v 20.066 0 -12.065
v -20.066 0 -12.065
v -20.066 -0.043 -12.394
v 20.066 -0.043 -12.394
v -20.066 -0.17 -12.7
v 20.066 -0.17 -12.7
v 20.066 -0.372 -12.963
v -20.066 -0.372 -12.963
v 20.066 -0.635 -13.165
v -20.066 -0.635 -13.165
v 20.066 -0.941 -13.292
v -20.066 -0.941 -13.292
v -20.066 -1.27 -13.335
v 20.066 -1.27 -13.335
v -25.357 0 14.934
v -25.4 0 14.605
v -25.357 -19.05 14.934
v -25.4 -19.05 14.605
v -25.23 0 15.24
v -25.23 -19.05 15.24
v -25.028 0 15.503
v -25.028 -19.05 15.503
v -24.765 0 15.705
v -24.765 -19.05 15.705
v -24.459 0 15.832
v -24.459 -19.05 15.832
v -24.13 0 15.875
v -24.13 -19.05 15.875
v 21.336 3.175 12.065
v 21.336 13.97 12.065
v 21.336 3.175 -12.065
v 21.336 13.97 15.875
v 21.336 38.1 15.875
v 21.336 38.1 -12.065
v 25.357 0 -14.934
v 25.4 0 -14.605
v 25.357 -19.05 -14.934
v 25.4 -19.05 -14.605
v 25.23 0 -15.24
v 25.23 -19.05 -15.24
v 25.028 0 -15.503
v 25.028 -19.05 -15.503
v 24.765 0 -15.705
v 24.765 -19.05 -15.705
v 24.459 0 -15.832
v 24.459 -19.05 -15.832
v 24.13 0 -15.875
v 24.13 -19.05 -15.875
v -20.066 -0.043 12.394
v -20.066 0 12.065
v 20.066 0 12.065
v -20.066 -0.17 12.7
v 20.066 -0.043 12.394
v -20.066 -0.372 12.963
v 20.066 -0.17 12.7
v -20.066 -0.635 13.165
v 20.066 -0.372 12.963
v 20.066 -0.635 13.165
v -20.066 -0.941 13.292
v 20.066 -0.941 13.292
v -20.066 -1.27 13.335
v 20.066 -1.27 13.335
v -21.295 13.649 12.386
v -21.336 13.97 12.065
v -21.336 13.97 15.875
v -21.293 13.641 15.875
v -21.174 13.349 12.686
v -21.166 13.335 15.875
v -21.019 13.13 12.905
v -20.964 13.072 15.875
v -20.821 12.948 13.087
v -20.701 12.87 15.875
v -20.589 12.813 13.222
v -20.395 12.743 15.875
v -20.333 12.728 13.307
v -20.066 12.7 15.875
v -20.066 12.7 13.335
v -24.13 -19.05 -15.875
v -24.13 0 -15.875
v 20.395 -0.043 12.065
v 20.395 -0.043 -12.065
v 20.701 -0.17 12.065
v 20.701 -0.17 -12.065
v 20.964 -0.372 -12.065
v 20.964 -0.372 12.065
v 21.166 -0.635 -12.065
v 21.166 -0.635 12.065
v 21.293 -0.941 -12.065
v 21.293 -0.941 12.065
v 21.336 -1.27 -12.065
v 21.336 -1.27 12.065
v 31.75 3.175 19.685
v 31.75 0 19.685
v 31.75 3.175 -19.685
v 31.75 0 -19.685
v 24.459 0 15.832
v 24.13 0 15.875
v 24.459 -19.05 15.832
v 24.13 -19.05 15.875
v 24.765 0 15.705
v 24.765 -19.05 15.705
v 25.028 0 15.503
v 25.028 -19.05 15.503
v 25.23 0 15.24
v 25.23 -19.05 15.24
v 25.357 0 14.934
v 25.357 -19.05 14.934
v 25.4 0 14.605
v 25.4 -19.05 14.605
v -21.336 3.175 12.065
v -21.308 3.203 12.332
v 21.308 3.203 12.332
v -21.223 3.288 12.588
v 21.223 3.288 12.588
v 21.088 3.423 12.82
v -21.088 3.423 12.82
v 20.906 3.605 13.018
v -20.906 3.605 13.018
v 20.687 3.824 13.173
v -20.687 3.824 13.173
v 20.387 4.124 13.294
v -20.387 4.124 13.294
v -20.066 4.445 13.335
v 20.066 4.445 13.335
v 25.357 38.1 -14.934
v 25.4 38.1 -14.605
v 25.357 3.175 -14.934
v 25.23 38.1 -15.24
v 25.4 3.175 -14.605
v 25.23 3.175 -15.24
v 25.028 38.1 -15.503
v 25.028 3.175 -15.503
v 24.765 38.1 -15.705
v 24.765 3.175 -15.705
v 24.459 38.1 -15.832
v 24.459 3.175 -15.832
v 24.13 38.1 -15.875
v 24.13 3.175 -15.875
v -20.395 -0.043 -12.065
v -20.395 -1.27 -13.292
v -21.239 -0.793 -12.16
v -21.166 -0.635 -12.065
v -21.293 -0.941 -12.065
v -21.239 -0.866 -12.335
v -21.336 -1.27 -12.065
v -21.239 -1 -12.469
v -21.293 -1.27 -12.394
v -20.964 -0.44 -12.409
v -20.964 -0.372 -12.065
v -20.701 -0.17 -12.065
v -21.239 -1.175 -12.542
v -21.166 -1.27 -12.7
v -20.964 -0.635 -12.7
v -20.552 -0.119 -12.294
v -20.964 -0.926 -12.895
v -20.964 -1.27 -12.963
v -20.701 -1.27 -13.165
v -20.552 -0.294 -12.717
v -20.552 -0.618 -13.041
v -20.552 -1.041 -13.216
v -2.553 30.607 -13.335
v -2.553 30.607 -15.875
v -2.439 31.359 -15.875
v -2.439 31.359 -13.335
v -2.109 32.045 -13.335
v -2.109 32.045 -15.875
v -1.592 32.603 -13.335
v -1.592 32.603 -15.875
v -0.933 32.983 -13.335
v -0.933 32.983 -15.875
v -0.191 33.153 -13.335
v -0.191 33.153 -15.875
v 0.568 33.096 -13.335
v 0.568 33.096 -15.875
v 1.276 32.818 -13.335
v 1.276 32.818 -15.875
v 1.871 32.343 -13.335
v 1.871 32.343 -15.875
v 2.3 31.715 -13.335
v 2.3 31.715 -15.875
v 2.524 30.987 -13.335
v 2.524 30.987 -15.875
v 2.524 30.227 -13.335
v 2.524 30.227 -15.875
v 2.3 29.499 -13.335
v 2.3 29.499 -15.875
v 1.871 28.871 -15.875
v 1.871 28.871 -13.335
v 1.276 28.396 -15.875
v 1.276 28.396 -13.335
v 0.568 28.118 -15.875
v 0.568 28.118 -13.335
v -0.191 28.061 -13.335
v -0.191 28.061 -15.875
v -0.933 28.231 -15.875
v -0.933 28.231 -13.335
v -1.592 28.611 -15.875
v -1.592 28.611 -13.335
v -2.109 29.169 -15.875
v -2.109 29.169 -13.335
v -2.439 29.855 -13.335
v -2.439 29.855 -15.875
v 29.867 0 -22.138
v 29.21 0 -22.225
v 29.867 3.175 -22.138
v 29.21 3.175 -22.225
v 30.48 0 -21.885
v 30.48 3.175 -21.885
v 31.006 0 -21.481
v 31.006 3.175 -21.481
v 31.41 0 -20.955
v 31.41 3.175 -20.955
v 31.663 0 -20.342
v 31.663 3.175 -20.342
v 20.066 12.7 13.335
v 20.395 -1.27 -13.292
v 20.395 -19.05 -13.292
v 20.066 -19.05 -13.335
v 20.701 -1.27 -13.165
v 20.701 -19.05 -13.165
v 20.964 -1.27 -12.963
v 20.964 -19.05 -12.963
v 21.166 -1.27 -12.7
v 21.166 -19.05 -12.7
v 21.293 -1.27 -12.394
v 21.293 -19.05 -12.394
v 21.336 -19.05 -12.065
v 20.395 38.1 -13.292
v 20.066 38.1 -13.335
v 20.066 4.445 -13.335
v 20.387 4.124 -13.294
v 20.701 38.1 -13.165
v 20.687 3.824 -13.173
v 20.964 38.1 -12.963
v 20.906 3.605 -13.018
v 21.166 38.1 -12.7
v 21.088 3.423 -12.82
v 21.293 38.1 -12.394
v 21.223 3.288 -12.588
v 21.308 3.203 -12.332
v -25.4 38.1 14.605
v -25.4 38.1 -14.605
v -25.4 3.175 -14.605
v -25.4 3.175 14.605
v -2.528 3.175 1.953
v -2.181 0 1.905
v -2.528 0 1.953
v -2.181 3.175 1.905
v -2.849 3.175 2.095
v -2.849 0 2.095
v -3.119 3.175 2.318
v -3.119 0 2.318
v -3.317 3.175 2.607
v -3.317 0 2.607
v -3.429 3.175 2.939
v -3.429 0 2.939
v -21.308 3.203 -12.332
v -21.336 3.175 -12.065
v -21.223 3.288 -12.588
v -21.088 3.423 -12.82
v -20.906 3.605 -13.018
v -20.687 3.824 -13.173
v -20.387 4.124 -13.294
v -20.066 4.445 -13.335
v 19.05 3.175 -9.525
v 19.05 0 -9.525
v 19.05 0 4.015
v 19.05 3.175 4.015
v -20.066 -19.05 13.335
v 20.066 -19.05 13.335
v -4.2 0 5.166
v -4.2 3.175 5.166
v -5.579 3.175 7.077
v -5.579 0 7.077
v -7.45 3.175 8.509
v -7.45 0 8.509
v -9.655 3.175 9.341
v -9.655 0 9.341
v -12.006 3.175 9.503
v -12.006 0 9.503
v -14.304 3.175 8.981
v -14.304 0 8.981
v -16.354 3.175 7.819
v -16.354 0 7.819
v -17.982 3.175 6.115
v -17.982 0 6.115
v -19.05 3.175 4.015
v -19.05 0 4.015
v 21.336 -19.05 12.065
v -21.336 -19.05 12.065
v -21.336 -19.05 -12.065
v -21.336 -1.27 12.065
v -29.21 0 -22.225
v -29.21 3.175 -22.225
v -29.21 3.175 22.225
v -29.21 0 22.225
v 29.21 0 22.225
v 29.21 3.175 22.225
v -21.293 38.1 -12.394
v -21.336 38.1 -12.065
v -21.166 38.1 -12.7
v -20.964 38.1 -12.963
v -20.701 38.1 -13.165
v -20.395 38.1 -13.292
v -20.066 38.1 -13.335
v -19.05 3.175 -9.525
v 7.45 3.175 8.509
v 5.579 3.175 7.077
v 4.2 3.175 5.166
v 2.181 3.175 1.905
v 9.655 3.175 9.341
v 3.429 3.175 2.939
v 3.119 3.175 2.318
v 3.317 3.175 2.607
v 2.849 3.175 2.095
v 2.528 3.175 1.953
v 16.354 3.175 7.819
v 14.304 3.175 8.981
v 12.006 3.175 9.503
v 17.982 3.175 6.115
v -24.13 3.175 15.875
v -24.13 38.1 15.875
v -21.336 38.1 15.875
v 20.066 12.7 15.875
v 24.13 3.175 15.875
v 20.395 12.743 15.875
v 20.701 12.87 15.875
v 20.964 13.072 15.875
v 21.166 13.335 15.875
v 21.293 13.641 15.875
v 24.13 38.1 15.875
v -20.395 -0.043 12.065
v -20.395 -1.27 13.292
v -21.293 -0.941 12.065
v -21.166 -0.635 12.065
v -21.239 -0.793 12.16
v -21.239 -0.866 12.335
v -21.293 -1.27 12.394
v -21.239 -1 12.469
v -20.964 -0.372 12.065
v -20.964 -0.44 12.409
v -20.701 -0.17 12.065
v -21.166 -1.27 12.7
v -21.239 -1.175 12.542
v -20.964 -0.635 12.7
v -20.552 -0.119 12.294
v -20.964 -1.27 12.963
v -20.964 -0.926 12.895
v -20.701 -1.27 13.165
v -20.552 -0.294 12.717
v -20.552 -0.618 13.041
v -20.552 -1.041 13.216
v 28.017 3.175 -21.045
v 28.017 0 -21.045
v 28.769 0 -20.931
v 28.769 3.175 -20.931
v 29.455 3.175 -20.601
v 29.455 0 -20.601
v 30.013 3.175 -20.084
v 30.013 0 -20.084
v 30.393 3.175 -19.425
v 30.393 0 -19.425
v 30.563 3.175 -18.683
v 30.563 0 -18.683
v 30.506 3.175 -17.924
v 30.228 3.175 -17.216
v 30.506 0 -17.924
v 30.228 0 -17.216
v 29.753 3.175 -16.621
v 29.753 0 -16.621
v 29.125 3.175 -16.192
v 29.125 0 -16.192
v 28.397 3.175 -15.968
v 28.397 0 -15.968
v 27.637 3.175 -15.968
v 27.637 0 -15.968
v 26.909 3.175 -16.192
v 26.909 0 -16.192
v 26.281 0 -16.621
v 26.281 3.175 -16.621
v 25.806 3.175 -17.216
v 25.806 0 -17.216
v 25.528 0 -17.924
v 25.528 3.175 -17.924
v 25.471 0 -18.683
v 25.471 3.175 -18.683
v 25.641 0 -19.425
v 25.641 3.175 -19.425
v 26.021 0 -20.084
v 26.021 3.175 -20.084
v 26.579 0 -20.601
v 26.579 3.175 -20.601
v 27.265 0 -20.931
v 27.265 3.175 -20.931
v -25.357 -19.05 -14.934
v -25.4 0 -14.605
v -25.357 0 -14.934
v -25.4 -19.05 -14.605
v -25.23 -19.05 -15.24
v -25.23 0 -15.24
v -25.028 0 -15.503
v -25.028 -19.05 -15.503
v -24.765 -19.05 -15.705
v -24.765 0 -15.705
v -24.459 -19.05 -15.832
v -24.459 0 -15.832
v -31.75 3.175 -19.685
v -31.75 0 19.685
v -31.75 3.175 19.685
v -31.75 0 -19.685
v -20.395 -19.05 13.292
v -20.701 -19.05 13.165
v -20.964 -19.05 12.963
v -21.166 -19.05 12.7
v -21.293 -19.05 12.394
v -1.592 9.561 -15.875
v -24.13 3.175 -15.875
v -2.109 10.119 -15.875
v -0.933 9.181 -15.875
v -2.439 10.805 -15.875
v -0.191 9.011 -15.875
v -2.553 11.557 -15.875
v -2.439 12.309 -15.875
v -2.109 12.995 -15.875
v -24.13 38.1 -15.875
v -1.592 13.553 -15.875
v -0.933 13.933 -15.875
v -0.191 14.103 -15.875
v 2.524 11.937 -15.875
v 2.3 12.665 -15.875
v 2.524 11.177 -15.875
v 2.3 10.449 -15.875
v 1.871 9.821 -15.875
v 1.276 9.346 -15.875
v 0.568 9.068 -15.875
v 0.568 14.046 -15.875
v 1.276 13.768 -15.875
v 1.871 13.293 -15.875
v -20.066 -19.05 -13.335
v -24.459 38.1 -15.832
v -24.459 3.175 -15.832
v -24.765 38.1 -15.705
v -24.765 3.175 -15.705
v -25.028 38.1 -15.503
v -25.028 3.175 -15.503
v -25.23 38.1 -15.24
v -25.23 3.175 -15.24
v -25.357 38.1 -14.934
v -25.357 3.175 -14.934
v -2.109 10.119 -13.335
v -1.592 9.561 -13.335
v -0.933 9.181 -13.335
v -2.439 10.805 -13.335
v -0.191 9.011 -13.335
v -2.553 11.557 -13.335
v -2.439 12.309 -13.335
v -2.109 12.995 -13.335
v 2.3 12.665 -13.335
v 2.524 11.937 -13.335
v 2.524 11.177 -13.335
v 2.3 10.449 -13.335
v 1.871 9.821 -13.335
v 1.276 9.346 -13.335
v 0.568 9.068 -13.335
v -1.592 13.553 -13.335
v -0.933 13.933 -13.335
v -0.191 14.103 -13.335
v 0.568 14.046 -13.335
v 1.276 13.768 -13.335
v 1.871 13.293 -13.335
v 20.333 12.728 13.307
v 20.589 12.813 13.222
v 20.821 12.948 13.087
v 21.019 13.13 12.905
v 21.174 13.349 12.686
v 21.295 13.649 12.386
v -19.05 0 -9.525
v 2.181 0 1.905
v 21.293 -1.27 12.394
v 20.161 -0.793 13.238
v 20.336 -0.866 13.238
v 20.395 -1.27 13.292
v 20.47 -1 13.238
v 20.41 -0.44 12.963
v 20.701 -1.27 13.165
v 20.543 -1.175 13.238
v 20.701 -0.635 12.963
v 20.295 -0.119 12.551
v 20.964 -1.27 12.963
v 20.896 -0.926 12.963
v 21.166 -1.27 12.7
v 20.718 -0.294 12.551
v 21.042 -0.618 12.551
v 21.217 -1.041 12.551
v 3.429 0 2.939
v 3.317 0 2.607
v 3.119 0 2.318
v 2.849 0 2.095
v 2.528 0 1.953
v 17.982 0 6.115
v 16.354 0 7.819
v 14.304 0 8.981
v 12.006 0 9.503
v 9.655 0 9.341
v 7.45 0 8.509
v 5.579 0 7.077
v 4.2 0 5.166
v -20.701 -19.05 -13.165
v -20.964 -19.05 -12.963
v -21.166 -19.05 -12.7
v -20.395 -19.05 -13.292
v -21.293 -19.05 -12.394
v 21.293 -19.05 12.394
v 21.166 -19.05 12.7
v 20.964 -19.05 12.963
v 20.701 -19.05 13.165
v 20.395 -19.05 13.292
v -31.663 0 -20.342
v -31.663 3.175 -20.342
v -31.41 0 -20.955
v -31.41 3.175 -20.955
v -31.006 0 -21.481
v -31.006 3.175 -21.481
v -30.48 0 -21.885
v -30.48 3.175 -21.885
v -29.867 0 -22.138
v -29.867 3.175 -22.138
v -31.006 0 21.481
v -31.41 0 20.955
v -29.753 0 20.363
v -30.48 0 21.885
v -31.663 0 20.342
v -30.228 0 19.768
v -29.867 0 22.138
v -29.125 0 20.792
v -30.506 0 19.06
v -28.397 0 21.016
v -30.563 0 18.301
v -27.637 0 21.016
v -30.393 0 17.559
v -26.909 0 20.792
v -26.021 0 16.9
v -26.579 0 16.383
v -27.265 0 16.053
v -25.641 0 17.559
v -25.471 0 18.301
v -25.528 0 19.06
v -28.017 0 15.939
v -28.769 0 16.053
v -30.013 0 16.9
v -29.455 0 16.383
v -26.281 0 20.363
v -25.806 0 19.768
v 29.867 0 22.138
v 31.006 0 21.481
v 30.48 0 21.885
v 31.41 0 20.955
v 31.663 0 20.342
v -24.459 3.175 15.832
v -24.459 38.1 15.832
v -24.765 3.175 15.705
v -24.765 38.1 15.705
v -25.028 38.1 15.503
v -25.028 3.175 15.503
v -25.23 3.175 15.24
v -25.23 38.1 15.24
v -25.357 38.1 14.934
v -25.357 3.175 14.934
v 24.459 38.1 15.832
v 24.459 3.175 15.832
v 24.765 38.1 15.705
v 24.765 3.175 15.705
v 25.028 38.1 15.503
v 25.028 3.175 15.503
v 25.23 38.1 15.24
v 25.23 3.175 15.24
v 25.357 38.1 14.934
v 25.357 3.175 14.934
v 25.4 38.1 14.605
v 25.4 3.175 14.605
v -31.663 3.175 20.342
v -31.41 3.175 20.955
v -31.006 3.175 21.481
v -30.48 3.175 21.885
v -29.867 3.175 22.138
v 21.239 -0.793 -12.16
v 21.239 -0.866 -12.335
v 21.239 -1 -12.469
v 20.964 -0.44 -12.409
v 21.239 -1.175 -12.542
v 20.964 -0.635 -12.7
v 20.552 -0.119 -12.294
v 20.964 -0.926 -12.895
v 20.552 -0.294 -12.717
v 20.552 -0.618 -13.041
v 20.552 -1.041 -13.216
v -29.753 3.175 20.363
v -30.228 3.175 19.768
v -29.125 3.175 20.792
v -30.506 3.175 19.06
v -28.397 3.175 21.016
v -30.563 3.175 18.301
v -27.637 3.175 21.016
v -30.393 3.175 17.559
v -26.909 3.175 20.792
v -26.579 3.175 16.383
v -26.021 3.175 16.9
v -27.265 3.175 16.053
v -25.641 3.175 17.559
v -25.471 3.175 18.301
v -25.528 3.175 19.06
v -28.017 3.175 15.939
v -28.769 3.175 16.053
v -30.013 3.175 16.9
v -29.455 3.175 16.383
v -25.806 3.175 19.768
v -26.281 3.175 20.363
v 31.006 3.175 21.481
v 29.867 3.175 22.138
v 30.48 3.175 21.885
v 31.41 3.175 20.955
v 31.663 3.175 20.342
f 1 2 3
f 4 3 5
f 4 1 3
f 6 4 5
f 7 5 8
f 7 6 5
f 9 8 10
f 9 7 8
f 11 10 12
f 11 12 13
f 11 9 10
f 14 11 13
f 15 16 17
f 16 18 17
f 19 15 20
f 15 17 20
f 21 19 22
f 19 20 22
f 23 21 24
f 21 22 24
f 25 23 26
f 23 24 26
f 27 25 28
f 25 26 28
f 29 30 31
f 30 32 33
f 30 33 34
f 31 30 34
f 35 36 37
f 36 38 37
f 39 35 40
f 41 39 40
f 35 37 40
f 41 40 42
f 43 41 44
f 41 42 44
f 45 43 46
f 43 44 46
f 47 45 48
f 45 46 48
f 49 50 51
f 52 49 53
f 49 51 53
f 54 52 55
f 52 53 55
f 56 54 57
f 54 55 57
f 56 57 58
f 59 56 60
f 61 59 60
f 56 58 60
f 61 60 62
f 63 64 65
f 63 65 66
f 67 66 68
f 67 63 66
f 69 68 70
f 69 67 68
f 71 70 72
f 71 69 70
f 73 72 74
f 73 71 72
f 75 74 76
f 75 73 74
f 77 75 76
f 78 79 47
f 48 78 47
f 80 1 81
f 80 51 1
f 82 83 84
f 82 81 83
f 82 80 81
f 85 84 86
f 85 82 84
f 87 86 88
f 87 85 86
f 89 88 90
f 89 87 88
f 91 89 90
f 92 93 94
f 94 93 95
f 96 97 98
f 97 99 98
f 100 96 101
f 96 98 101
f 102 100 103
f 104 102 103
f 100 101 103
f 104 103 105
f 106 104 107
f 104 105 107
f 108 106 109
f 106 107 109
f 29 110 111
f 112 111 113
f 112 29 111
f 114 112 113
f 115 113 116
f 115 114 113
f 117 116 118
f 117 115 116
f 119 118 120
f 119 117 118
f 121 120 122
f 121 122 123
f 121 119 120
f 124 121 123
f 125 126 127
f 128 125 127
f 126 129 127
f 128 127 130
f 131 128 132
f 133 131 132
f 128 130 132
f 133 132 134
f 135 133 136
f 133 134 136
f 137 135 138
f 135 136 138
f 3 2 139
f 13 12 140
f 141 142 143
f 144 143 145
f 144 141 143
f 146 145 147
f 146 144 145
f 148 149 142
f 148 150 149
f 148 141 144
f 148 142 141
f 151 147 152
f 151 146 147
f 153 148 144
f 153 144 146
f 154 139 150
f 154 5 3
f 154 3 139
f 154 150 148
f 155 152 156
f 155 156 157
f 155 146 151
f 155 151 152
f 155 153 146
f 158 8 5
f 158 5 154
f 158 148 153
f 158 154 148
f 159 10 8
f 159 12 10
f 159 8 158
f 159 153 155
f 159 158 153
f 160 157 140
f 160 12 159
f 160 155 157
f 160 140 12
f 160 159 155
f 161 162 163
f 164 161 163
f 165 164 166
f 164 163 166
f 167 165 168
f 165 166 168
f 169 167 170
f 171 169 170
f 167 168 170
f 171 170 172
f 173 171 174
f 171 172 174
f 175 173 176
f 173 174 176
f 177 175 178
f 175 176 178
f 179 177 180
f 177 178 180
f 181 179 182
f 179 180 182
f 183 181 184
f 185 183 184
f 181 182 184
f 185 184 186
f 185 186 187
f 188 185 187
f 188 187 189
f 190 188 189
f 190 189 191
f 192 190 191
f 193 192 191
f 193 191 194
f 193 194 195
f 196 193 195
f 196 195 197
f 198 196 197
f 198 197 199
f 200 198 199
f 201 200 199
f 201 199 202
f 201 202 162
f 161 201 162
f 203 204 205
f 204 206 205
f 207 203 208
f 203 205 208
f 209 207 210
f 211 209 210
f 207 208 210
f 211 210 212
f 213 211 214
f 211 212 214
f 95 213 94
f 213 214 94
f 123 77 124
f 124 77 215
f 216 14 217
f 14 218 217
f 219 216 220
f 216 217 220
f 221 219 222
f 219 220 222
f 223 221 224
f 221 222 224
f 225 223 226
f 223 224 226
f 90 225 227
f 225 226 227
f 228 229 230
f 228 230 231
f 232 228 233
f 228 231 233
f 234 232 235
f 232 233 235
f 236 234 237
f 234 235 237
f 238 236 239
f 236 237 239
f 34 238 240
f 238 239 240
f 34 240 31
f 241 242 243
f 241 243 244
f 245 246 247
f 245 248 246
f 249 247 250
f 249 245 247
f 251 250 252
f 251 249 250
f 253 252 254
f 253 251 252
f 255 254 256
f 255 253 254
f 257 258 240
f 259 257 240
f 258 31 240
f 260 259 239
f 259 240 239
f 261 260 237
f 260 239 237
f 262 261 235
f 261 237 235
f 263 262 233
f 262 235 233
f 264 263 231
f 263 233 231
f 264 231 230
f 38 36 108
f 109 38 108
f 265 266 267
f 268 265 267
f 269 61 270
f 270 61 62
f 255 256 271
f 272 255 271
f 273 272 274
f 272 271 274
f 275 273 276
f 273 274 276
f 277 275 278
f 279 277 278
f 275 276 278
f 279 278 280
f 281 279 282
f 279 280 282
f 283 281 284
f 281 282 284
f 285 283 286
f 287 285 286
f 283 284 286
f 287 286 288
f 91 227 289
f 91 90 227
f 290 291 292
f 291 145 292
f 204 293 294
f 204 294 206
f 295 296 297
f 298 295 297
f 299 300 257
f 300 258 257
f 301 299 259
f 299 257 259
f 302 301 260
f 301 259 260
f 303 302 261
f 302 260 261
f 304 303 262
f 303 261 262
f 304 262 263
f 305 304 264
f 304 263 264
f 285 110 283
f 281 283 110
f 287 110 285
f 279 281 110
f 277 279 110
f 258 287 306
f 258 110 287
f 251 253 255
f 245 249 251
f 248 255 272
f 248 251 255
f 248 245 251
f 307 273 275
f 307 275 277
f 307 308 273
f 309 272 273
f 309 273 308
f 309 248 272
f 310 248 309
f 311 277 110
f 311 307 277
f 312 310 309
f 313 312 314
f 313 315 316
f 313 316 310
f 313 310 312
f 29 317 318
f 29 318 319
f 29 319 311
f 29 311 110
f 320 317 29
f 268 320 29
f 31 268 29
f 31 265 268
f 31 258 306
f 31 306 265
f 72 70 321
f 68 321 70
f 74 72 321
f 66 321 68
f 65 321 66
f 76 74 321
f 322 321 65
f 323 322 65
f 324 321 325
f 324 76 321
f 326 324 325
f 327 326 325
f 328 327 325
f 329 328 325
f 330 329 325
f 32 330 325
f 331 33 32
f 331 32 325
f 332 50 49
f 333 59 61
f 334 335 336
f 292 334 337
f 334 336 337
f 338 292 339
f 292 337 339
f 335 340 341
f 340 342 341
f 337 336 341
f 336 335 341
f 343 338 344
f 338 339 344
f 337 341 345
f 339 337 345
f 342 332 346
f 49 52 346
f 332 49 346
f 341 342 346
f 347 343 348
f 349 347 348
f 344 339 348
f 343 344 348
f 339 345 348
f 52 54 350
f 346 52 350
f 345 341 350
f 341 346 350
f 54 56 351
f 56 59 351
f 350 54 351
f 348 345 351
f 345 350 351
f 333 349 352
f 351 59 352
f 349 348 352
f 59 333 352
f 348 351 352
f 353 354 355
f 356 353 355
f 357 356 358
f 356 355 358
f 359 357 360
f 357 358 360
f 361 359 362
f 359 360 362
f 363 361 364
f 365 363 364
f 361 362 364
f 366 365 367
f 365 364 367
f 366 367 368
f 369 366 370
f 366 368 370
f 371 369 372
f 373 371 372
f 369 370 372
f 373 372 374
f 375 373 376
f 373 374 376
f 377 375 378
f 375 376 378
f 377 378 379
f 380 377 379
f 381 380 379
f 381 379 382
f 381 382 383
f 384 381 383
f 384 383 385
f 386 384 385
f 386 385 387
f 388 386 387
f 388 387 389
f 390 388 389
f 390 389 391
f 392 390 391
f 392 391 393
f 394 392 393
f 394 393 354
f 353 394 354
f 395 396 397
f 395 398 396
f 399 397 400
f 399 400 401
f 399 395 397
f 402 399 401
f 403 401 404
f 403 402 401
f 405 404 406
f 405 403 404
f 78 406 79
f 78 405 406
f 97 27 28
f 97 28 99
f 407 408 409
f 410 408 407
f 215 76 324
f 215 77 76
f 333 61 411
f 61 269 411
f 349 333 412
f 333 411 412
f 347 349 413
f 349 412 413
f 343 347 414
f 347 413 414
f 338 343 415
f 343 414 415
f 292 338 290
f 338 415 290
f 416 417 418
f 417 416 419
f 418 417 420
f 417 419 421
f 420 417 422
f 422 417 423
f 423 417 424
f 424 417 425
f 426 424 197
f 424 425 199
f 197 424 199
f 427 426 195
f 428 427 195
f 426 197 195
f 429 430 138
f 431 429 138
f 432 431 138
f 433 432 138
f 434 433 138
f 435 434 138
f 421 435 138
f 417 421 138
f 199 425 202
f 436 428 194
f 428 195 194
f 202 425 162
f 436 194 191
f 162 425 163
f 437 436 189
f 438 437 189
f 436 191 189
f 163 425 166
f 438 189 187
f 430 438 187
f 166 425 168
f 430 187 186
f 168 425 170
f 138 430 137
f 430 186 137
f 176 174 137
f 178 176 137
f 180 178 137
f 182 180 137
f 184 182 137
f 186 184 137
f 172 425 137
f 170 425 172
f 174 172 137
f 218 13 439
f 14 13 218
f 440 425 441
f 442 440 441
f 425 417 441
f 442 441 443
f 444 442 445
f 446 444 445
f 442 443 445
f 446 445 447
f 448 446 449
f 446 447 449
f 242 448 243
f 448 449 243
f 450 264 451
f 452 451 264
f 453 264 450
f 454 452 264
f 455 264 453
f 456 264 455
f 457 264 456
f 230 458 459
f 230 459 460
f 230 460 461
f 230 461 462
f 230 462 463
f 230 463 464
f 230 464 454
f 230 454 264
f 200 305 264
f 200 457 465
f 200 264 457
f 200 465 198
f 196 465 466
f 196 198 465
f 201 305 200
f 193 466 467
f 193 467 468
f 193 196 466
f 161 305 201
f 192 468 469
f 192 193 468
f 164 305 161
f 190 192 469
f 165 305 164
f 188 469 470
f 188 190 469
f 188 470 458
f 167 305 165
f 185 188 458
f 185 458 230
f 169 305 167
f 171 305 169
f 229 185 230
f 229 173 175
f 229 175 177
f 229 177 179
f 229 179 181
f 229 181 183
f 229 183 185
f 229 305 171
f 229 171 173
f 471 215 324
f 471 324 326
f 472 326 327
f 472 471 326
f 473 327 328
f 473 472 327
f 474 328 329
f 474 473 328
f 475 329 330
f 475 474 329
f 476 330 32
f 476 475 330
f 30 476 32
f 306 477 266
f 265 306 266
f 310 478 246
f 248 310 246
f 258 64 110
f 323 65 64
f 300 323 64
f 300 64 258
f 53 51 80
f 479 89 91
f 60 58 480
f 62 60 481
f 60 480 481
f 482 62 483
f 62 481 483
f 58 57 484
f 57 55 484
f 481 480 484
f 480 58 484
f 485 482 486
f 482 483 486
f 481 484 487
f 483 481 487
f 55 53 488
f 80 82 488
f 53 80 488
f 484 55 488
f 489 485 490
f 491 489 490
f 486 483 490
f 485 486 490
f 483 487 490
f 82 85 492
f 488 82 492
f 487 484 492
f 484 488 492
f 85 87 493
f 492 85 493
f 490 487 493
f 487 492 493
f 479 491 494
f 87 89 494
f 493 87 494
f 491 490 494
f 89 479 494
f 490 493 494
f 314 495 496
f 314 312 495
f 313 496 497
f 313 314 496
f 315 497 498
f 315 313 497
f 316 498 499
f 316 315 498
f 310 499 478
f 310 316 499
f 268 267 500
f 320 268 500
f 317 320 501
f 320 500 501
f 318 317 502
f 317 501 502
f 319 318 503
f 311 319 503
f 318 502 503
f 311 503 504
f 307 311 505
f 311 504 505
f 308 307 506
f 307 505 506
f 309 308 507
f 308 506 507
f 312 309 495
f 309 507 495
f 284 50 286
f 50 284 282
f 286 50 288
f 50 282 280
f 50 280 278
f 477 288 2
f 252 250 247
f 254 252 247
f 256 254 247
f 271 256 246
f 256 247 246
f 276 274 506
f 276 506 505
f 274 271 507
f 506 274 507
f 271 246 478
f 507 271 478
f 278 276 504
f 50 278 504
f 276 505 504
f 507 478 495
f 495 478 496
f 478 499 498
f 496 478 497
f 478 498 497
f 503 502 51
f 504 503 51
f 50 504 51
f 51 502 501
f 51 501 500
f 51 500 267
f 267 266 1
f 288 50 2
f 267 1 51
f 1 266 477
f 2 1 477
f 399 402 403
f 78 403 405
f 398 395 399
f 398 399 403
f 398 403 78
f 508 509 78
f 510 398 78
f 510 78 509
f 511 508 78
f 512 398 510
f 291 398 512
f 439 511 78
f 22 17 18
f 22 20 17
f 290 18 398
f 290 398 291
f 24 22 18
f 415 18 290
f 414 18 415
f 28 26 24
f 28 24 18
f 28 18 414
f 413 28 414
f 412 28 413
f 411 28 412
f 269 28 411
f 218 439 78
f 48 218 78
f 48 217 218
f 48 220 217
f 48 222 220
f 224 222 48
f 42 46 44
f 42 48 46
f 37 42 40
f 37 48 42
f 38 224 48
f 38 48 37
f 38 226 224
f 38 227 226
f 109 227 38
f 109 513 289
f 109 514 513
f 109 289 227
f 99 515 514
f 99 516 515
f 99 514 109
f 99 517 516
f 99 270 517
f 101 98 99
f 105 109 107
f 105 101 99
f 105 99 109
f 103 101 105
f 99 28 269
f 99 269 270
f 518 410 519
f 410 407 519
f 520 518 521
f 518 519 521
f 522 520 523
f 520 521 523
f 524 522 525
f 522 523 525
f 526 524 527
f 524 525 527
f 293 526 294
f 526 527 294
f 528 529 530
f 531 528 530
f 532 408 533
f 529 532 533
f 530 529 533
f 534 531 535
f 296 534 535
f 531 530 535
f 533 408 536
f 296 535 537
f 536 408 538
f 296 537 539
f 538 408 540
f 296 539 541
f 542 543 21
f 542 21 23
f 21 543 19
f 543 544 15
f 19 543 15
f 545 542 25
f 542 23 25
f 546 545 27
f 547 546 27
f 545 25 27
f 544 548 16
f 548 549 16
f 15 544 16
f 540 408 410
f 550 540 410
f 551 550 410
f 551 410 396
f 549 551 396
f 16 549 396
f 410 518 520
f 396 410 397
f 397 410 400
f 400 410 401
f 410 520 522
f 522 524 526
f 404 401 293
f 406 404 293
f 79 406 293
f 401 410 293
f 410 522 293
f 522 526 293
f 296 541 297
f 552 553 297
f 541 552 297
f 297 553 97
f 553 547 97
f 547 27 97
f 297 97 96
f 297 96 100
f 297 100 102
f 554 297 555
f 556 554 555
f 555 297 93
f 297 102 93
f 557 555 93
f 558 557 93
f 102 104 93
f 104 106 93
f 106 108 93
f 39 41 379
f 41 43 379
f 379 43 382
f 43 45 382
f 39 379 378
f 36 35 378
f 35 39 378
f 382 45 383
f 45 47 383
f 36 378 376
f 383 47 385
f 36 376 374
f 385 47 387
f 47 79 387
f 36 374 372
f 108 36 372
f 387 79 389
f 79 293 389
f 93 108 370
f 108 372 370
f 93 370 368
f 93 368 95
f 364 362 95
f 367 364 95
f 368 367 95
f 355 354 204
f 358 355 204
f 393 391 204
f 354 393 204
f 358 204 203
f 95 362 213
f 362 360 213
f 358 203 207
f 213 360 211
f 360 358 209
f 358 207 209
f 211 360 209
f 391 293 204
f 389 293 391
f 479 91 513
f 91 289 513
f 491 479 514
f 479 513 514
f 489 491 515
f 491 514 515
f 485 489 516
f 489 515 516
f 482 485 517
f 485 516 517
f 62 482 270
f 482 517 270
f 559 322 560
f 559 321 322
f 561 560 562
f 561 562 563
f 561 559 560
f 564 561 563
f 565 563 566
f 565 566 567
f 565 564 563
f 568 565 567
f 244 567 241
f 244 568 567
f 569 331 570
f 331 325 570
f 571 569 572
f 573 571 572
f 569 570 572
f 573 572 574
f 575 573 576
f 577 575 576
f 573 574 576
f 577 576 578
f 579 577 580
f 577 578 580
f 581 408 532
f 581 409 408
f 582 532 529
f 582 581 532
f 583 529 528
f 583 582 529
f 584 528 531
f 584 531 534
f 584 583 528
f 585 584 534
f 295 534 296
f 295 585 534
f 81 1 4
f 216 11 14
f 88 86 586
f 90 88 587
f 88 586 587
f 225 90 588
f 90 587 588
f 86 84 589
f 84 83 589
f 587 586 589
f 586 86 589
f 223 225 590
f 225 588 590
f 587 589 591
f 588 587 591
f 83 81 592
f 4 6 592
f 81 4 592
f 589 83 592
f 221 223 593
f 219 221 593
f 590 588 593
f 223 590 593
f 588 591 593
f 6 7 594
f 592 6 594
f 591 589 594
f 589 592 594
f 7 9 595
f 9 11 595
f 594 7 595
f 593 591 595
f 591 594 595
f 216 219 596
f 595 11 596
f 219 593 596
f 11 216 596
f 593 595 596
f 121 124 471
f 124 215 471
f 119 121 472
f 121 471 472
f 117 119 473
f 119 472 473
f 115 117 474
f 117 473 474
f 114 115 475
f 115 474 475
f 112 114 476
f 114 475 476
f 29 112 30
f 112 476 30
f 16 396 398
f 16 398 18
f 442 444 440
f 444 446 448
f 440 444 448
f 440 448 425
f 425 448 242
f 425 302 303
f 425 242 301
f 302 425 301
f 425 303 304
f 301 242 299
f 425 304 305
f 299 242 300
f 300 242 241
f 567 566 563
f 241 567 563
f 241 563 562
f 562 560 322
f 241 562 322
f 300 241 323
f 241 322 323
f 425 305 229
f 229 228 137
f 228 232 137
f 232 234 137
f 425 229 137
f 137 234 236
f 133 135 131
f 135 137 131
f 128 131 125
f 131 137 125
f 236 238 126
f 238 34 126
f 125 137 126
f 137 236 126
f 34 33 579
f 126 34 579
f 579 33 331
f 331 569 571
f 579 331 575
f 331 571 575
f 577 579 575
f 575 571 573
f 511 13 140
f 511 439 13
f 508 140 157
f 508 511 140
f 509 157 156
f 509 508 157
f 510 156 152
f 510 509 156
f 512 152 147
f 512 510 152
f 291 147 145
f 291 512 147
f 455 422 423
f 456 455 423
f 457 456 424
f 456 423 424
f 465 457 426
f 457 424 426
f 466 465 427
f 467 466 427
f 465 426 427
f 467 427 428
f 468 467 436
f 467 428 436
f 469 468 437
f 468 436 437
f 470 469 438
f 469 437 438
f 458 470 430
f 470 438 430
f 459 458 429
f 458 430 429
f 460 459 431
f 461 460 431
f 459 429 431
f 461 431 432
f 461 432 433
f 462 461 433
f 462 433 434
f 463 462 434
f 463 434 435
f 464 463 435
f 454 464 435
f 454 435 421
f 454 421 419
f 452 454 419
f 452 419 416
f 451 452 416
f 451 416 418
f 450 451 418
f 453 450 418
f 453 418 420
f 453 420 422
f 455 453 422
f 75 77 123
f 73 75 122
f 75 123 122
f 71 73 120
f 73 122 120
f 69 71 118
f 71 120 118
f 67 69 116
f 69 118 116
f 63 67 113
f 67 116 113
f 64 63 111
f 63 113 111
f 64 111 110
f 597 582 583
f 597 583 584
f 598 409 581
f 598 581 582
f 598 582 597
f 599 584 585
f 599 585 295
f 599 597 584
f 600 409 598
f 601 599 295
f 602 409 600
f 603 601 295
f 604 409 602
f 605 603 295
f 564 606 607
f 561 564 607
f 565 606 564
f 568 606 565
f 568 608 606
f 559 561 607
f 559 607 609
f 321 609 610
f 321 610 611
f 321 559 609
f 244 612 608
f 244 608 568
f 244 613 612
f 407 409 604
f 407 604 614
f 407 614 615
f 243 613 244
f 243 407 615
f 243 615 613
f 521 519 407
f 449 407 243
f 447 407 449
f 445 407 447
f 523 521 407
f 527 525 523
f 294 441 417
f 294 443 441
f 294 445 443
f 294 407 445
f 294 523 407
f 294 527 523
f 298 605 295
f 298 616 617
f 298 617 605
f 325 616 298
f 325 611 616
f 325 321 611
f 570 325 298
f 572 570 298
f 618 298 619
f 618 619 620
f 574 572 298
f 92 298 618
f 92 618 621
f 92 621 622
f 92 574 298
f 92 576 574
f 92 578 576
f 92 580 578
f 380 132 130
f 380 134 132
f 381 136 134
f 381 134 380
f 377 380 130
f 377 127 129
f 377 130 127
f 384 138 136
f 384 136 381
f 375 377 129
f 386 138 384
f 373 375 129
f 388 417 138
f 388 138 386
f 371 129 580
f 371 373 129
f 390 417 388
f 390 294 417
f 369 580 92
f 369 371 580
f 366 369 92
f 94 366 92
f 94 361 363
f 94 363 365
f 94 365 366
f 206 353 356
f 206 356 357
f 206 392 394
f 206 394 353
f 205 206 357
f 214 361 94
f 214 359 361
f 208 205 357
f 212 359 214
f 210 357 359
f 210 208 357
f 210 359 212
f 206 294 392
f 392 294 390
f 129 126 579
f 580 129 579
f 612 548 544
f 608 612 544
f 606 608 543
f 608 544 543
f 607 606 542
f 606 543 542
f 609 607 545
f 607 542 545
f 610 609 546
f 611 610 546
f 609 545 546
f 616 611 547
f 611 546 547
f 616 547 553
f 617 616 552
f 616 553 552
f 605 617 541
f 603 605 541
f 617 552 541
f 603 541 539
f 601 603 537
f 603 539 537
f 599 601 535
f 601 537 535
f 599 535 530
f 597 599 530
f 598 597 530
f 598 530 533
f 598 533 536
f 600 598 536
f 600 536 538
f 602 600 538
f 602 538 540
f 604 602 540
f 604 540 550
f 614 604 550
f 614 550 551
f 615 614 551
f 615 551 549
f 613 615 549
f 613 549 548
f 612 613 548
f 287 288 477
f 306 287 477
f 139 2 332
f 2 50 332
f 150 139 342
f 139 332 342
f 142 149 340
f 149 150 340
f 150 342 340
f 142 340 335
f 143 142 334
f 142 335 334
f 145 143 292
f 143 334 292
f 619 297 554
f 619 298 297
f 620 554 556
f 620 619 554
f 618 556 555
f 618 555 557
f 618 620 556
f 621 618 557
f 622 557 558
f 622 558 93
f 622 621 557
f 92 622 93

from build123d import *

# Parameters (mm, degrees)
SKETCH1_W                = 63.5
SKETCH1_H                = 44.45
BOSS_EXTRUDE1_DEPTH      = 3.175
FILLET3_R                = 2.54
BOSS_EXTRUDE3_DEPTH      = 19.05
BOSS_EXTRUDE3_DEPTH_BACK = 38.1
SKETCH3_W                = 50.8
SKETCH3_H                = 31.75
SKETCH3_W_2              = 42.672
SKETCH3_H_2              = 26.67
FILLET4_R                = 1.27
SKETCH4_W                = 42.672
SKETCH4_H                = 2.54
CUT_EXTRUDE1_DEPTH       = 25.4
FILLET5_R                = 1.27
FILLET6_R                = 1.27
CUT_EXTRUDE2_REACH       = 64.54
SKETCH5_R                = 2.5527
CUT_EXTRUDE3_REACH       = 56.347
SKETCH6_R                = 2.5527
FILLET7_R                = 1.27


with BuildPart() as part:
    # Sketch1 → Boss-Extrude1 (new body)
    with BuildSketch(Plane(origin=(0, 0, 0), x_dir=(1, 0, 0), z_dir=(0, 1, 0))):
        Rectangle(SKETCH1_W, SKETCH1_H)
        with BuildLine():
            Line((-19.05, -4.014611111), (-19.05, 9.525))
            Line((-19.05, 9.525), (19.05, 9.525))
            Line((19.05, 9.525), (19.05, -4.014611111))
            ThreePointArc((19.05, -4.014611111), (10.305774977, -9.455933485), (3.302, -1.905))
            Line((3.302, -1.905), (-3.302, -1.905))
            ThreePointArc((-3.302, -1.905), (-10.305774977, -9.455933485), (-19.05, -4.014611111))
        make_face(mode=Mode.SUBTRACT)
    extrude(amount=BOSS_EXTRUDE1_DEPTH)

    # Fillet3
    fillet3_edges = [part.edges().sort_by_distance(p)[0] for p in [
        (-31.75, 1.5875, 22.225),
        (-31.75, 1.5875, -22.225),
        (31.75, 1.5875, -22.225),
        (31.75, 1.5875, 22.225),
    ]]
    fillet(fillet3_edges, radius=FILLET3_R)

    # Sketch3 → Boss-Extrude3 (add, two sides: drawn at the far end of the back side and taken through both)
    with BuildSketch(Plane.XZ.offset(-BOSS_EXTRUDE3_DEPTH_BACK)):
        Rectangle(SKETCH3_W, SKETCH3_H)
        Rectangle(SKETCH3_W_2, SKETCH3_H_2, mode=Mode.SUBTRACT)
    extrude(amount=BOSS_EXTRUDE3_DEPTH + BOSS_EXTRUDE3_DEPTH_BACK)

    # Fillet4
    fillet4_edges = [part.edges().sort_by_distance(p)[0] for p in [
        (0, 0, -13.335),
        (21.336, 0, 0),
        (0, 0, 13.335),
        (-21.336, 0, 0),
        (-25.4, -9.525, -15.875),
        (-25.4, -9.525, 15.875),
        (25.4, -9.525, 15.875),
        (25.4, -9.525, -15.875),
        (-21.336, -9.525, 13.335),
        (21.336, -9.525, 13.335),
        (21.336, -9.525, -13.335),
        (-21.336, -9.525, -13.335),
    ]]
    fillet(fillet4_edges, radius=FILLET4_R)

    # Sketch4 → Cut-Extrude1 (cut)
    with BuildSketch(Plane(origin=(0, 38.1, 0), x_dir=(1, 0, 0), z_dir=(0, 1, 0))):
        with Locations((0, -14.605)):
            Rectangle(SKETCH4_W, SKETCH4_H)
    extrude(amount=-CUT_EXTRUDE1_DEPTH, mode=Mode.SUBTRACT)

    # Fillet5
    fillet5_edges = [part.edges().sort_by_distance(p)[0] for p in [
        (21.336, 12.7, 14.605),
        (-21.336, 12.7, 14.605),
        (-3.302, 1.5875, 1.905),
        (3.302, 1.5875, 1.905),
        (0, 3.175, -13.335),
        (21.336, 20.6375, -13.335),
        (-21.336, 20.6375, -13.335),
    ]]
    fillet(fillet5_edges, radius=FILLET5_R)

    # Fillet6
    fillet6_edges = [part.edges().sort_by_distance(p)[0] for p in [
        (0, 3.175, 13.335),
        (-21.336, 8.5725, 13.335),
        (21.336, 8.5725, 13.335),
    ]]
    fillet(fillet6_edges, radius=FILLET6_R)

    # Sketch5 → Cut-Extrude2 (cut, up to next)
    with BuildSketch(Plane(origin=(0, 0, -15.875), x_dir=(-1, 0, 0), z_dir=(0, 0, -1)), mode=Mode.PRIVATE) as cut_extrude2_sk1:
        with Locations((0, 11.557)):
            Circle(SKETCH5_R)
    cut_extrude2_tool1 = extrude(cut_extrude2_sk1.sketch, amount=-CUT_EXTRUDE2_REACH, mode=Mode.PRIVATE) & part.part
    # Sketch5 → Cut-Extrude2 (cut, up to next)
    with BuildSketch(Plane(origin=(0, 0, -15.875), x_dir=(-1, 0, 0), z_dir=(0, 0, -1)), mode=Mode.PRIVATE) as cut_extrude2_sk2:
        with Locations((0, 30.607)):
            Circle(SKETCH5_R)
    cut_extrude2_tool2 = extrude(cut_extrude2_sk2.sketch, amount=-CUT_EXTRUDE2_REACH, mode=Mode.PRIVATE) & part.part
    add(cut_extrude2_tool1.solids().sort_by_distance((0, 11.557, -15.875))[0], mode=Mode.SUBTRACT)
    add(cut_extrude2_tool2.solids().sort_by_distance((0, 30.607, -15.875))[0], mode=Mode.SUBTRACT)

    # Sketch6 → Cut-Extrude3 (cut, up to next)
    with BuildSketch(Plane.XZ, mode=Mode.PRIVATE) as cut_extrude3_sk1:
        with Locations(Location((28.017038418, -18.492038418, 0), (0, 0, 270))):
            Circle(SKETCH6_R)
    cut_extrude3_tool1 = extrude(cut_extrude3_sk1.sketch, amount=-CUT_EXTRUDE3_REACH, mode=Mode.PRIVATE) & part.part
    # Sketch6 → Cut-Extrude3 (cut, up to next)
    with BuildSketch(Plane.XZ, mode=Mode.PRIVATE) as cut_extrude3_sk2:
        with Locations(Location((-28.017038418, 18.492038418, 0), (0, 0, 270))):
            Circle(SKETCH6_R)
    cut_extrude3_tool2 = extrude(cut_extrude3_sk2.sketch, amount=-CUT_EXTRUDE3_REACH, mode=Mode.PRIVATE) & part.part
    add(cut_extrude3_tool1.solids().sort_by_distance((28.017038, 0, -18.492038))[0], mode=Mode.SUBTRACT)
    add(cut_extrude3_tool2.solids().sort_by_distance((-28.017038, 0, 18.492038))[0], mode=Mode.SUBTRACT)

    # Fillet7
    fillet7_edges = [part.edges().sort_by_distance(p)[0] for p in [
        (-25.4, 20.6375, -15.875),
        (-25.4, 20.6375, 15.875),
        (25.4, 20.6375, 15.875),
        (25.4, 20.6375, -15.875),
    ]]
    fillet(fillet7_edges, radius=FILLET7_R)


solid = part.part
